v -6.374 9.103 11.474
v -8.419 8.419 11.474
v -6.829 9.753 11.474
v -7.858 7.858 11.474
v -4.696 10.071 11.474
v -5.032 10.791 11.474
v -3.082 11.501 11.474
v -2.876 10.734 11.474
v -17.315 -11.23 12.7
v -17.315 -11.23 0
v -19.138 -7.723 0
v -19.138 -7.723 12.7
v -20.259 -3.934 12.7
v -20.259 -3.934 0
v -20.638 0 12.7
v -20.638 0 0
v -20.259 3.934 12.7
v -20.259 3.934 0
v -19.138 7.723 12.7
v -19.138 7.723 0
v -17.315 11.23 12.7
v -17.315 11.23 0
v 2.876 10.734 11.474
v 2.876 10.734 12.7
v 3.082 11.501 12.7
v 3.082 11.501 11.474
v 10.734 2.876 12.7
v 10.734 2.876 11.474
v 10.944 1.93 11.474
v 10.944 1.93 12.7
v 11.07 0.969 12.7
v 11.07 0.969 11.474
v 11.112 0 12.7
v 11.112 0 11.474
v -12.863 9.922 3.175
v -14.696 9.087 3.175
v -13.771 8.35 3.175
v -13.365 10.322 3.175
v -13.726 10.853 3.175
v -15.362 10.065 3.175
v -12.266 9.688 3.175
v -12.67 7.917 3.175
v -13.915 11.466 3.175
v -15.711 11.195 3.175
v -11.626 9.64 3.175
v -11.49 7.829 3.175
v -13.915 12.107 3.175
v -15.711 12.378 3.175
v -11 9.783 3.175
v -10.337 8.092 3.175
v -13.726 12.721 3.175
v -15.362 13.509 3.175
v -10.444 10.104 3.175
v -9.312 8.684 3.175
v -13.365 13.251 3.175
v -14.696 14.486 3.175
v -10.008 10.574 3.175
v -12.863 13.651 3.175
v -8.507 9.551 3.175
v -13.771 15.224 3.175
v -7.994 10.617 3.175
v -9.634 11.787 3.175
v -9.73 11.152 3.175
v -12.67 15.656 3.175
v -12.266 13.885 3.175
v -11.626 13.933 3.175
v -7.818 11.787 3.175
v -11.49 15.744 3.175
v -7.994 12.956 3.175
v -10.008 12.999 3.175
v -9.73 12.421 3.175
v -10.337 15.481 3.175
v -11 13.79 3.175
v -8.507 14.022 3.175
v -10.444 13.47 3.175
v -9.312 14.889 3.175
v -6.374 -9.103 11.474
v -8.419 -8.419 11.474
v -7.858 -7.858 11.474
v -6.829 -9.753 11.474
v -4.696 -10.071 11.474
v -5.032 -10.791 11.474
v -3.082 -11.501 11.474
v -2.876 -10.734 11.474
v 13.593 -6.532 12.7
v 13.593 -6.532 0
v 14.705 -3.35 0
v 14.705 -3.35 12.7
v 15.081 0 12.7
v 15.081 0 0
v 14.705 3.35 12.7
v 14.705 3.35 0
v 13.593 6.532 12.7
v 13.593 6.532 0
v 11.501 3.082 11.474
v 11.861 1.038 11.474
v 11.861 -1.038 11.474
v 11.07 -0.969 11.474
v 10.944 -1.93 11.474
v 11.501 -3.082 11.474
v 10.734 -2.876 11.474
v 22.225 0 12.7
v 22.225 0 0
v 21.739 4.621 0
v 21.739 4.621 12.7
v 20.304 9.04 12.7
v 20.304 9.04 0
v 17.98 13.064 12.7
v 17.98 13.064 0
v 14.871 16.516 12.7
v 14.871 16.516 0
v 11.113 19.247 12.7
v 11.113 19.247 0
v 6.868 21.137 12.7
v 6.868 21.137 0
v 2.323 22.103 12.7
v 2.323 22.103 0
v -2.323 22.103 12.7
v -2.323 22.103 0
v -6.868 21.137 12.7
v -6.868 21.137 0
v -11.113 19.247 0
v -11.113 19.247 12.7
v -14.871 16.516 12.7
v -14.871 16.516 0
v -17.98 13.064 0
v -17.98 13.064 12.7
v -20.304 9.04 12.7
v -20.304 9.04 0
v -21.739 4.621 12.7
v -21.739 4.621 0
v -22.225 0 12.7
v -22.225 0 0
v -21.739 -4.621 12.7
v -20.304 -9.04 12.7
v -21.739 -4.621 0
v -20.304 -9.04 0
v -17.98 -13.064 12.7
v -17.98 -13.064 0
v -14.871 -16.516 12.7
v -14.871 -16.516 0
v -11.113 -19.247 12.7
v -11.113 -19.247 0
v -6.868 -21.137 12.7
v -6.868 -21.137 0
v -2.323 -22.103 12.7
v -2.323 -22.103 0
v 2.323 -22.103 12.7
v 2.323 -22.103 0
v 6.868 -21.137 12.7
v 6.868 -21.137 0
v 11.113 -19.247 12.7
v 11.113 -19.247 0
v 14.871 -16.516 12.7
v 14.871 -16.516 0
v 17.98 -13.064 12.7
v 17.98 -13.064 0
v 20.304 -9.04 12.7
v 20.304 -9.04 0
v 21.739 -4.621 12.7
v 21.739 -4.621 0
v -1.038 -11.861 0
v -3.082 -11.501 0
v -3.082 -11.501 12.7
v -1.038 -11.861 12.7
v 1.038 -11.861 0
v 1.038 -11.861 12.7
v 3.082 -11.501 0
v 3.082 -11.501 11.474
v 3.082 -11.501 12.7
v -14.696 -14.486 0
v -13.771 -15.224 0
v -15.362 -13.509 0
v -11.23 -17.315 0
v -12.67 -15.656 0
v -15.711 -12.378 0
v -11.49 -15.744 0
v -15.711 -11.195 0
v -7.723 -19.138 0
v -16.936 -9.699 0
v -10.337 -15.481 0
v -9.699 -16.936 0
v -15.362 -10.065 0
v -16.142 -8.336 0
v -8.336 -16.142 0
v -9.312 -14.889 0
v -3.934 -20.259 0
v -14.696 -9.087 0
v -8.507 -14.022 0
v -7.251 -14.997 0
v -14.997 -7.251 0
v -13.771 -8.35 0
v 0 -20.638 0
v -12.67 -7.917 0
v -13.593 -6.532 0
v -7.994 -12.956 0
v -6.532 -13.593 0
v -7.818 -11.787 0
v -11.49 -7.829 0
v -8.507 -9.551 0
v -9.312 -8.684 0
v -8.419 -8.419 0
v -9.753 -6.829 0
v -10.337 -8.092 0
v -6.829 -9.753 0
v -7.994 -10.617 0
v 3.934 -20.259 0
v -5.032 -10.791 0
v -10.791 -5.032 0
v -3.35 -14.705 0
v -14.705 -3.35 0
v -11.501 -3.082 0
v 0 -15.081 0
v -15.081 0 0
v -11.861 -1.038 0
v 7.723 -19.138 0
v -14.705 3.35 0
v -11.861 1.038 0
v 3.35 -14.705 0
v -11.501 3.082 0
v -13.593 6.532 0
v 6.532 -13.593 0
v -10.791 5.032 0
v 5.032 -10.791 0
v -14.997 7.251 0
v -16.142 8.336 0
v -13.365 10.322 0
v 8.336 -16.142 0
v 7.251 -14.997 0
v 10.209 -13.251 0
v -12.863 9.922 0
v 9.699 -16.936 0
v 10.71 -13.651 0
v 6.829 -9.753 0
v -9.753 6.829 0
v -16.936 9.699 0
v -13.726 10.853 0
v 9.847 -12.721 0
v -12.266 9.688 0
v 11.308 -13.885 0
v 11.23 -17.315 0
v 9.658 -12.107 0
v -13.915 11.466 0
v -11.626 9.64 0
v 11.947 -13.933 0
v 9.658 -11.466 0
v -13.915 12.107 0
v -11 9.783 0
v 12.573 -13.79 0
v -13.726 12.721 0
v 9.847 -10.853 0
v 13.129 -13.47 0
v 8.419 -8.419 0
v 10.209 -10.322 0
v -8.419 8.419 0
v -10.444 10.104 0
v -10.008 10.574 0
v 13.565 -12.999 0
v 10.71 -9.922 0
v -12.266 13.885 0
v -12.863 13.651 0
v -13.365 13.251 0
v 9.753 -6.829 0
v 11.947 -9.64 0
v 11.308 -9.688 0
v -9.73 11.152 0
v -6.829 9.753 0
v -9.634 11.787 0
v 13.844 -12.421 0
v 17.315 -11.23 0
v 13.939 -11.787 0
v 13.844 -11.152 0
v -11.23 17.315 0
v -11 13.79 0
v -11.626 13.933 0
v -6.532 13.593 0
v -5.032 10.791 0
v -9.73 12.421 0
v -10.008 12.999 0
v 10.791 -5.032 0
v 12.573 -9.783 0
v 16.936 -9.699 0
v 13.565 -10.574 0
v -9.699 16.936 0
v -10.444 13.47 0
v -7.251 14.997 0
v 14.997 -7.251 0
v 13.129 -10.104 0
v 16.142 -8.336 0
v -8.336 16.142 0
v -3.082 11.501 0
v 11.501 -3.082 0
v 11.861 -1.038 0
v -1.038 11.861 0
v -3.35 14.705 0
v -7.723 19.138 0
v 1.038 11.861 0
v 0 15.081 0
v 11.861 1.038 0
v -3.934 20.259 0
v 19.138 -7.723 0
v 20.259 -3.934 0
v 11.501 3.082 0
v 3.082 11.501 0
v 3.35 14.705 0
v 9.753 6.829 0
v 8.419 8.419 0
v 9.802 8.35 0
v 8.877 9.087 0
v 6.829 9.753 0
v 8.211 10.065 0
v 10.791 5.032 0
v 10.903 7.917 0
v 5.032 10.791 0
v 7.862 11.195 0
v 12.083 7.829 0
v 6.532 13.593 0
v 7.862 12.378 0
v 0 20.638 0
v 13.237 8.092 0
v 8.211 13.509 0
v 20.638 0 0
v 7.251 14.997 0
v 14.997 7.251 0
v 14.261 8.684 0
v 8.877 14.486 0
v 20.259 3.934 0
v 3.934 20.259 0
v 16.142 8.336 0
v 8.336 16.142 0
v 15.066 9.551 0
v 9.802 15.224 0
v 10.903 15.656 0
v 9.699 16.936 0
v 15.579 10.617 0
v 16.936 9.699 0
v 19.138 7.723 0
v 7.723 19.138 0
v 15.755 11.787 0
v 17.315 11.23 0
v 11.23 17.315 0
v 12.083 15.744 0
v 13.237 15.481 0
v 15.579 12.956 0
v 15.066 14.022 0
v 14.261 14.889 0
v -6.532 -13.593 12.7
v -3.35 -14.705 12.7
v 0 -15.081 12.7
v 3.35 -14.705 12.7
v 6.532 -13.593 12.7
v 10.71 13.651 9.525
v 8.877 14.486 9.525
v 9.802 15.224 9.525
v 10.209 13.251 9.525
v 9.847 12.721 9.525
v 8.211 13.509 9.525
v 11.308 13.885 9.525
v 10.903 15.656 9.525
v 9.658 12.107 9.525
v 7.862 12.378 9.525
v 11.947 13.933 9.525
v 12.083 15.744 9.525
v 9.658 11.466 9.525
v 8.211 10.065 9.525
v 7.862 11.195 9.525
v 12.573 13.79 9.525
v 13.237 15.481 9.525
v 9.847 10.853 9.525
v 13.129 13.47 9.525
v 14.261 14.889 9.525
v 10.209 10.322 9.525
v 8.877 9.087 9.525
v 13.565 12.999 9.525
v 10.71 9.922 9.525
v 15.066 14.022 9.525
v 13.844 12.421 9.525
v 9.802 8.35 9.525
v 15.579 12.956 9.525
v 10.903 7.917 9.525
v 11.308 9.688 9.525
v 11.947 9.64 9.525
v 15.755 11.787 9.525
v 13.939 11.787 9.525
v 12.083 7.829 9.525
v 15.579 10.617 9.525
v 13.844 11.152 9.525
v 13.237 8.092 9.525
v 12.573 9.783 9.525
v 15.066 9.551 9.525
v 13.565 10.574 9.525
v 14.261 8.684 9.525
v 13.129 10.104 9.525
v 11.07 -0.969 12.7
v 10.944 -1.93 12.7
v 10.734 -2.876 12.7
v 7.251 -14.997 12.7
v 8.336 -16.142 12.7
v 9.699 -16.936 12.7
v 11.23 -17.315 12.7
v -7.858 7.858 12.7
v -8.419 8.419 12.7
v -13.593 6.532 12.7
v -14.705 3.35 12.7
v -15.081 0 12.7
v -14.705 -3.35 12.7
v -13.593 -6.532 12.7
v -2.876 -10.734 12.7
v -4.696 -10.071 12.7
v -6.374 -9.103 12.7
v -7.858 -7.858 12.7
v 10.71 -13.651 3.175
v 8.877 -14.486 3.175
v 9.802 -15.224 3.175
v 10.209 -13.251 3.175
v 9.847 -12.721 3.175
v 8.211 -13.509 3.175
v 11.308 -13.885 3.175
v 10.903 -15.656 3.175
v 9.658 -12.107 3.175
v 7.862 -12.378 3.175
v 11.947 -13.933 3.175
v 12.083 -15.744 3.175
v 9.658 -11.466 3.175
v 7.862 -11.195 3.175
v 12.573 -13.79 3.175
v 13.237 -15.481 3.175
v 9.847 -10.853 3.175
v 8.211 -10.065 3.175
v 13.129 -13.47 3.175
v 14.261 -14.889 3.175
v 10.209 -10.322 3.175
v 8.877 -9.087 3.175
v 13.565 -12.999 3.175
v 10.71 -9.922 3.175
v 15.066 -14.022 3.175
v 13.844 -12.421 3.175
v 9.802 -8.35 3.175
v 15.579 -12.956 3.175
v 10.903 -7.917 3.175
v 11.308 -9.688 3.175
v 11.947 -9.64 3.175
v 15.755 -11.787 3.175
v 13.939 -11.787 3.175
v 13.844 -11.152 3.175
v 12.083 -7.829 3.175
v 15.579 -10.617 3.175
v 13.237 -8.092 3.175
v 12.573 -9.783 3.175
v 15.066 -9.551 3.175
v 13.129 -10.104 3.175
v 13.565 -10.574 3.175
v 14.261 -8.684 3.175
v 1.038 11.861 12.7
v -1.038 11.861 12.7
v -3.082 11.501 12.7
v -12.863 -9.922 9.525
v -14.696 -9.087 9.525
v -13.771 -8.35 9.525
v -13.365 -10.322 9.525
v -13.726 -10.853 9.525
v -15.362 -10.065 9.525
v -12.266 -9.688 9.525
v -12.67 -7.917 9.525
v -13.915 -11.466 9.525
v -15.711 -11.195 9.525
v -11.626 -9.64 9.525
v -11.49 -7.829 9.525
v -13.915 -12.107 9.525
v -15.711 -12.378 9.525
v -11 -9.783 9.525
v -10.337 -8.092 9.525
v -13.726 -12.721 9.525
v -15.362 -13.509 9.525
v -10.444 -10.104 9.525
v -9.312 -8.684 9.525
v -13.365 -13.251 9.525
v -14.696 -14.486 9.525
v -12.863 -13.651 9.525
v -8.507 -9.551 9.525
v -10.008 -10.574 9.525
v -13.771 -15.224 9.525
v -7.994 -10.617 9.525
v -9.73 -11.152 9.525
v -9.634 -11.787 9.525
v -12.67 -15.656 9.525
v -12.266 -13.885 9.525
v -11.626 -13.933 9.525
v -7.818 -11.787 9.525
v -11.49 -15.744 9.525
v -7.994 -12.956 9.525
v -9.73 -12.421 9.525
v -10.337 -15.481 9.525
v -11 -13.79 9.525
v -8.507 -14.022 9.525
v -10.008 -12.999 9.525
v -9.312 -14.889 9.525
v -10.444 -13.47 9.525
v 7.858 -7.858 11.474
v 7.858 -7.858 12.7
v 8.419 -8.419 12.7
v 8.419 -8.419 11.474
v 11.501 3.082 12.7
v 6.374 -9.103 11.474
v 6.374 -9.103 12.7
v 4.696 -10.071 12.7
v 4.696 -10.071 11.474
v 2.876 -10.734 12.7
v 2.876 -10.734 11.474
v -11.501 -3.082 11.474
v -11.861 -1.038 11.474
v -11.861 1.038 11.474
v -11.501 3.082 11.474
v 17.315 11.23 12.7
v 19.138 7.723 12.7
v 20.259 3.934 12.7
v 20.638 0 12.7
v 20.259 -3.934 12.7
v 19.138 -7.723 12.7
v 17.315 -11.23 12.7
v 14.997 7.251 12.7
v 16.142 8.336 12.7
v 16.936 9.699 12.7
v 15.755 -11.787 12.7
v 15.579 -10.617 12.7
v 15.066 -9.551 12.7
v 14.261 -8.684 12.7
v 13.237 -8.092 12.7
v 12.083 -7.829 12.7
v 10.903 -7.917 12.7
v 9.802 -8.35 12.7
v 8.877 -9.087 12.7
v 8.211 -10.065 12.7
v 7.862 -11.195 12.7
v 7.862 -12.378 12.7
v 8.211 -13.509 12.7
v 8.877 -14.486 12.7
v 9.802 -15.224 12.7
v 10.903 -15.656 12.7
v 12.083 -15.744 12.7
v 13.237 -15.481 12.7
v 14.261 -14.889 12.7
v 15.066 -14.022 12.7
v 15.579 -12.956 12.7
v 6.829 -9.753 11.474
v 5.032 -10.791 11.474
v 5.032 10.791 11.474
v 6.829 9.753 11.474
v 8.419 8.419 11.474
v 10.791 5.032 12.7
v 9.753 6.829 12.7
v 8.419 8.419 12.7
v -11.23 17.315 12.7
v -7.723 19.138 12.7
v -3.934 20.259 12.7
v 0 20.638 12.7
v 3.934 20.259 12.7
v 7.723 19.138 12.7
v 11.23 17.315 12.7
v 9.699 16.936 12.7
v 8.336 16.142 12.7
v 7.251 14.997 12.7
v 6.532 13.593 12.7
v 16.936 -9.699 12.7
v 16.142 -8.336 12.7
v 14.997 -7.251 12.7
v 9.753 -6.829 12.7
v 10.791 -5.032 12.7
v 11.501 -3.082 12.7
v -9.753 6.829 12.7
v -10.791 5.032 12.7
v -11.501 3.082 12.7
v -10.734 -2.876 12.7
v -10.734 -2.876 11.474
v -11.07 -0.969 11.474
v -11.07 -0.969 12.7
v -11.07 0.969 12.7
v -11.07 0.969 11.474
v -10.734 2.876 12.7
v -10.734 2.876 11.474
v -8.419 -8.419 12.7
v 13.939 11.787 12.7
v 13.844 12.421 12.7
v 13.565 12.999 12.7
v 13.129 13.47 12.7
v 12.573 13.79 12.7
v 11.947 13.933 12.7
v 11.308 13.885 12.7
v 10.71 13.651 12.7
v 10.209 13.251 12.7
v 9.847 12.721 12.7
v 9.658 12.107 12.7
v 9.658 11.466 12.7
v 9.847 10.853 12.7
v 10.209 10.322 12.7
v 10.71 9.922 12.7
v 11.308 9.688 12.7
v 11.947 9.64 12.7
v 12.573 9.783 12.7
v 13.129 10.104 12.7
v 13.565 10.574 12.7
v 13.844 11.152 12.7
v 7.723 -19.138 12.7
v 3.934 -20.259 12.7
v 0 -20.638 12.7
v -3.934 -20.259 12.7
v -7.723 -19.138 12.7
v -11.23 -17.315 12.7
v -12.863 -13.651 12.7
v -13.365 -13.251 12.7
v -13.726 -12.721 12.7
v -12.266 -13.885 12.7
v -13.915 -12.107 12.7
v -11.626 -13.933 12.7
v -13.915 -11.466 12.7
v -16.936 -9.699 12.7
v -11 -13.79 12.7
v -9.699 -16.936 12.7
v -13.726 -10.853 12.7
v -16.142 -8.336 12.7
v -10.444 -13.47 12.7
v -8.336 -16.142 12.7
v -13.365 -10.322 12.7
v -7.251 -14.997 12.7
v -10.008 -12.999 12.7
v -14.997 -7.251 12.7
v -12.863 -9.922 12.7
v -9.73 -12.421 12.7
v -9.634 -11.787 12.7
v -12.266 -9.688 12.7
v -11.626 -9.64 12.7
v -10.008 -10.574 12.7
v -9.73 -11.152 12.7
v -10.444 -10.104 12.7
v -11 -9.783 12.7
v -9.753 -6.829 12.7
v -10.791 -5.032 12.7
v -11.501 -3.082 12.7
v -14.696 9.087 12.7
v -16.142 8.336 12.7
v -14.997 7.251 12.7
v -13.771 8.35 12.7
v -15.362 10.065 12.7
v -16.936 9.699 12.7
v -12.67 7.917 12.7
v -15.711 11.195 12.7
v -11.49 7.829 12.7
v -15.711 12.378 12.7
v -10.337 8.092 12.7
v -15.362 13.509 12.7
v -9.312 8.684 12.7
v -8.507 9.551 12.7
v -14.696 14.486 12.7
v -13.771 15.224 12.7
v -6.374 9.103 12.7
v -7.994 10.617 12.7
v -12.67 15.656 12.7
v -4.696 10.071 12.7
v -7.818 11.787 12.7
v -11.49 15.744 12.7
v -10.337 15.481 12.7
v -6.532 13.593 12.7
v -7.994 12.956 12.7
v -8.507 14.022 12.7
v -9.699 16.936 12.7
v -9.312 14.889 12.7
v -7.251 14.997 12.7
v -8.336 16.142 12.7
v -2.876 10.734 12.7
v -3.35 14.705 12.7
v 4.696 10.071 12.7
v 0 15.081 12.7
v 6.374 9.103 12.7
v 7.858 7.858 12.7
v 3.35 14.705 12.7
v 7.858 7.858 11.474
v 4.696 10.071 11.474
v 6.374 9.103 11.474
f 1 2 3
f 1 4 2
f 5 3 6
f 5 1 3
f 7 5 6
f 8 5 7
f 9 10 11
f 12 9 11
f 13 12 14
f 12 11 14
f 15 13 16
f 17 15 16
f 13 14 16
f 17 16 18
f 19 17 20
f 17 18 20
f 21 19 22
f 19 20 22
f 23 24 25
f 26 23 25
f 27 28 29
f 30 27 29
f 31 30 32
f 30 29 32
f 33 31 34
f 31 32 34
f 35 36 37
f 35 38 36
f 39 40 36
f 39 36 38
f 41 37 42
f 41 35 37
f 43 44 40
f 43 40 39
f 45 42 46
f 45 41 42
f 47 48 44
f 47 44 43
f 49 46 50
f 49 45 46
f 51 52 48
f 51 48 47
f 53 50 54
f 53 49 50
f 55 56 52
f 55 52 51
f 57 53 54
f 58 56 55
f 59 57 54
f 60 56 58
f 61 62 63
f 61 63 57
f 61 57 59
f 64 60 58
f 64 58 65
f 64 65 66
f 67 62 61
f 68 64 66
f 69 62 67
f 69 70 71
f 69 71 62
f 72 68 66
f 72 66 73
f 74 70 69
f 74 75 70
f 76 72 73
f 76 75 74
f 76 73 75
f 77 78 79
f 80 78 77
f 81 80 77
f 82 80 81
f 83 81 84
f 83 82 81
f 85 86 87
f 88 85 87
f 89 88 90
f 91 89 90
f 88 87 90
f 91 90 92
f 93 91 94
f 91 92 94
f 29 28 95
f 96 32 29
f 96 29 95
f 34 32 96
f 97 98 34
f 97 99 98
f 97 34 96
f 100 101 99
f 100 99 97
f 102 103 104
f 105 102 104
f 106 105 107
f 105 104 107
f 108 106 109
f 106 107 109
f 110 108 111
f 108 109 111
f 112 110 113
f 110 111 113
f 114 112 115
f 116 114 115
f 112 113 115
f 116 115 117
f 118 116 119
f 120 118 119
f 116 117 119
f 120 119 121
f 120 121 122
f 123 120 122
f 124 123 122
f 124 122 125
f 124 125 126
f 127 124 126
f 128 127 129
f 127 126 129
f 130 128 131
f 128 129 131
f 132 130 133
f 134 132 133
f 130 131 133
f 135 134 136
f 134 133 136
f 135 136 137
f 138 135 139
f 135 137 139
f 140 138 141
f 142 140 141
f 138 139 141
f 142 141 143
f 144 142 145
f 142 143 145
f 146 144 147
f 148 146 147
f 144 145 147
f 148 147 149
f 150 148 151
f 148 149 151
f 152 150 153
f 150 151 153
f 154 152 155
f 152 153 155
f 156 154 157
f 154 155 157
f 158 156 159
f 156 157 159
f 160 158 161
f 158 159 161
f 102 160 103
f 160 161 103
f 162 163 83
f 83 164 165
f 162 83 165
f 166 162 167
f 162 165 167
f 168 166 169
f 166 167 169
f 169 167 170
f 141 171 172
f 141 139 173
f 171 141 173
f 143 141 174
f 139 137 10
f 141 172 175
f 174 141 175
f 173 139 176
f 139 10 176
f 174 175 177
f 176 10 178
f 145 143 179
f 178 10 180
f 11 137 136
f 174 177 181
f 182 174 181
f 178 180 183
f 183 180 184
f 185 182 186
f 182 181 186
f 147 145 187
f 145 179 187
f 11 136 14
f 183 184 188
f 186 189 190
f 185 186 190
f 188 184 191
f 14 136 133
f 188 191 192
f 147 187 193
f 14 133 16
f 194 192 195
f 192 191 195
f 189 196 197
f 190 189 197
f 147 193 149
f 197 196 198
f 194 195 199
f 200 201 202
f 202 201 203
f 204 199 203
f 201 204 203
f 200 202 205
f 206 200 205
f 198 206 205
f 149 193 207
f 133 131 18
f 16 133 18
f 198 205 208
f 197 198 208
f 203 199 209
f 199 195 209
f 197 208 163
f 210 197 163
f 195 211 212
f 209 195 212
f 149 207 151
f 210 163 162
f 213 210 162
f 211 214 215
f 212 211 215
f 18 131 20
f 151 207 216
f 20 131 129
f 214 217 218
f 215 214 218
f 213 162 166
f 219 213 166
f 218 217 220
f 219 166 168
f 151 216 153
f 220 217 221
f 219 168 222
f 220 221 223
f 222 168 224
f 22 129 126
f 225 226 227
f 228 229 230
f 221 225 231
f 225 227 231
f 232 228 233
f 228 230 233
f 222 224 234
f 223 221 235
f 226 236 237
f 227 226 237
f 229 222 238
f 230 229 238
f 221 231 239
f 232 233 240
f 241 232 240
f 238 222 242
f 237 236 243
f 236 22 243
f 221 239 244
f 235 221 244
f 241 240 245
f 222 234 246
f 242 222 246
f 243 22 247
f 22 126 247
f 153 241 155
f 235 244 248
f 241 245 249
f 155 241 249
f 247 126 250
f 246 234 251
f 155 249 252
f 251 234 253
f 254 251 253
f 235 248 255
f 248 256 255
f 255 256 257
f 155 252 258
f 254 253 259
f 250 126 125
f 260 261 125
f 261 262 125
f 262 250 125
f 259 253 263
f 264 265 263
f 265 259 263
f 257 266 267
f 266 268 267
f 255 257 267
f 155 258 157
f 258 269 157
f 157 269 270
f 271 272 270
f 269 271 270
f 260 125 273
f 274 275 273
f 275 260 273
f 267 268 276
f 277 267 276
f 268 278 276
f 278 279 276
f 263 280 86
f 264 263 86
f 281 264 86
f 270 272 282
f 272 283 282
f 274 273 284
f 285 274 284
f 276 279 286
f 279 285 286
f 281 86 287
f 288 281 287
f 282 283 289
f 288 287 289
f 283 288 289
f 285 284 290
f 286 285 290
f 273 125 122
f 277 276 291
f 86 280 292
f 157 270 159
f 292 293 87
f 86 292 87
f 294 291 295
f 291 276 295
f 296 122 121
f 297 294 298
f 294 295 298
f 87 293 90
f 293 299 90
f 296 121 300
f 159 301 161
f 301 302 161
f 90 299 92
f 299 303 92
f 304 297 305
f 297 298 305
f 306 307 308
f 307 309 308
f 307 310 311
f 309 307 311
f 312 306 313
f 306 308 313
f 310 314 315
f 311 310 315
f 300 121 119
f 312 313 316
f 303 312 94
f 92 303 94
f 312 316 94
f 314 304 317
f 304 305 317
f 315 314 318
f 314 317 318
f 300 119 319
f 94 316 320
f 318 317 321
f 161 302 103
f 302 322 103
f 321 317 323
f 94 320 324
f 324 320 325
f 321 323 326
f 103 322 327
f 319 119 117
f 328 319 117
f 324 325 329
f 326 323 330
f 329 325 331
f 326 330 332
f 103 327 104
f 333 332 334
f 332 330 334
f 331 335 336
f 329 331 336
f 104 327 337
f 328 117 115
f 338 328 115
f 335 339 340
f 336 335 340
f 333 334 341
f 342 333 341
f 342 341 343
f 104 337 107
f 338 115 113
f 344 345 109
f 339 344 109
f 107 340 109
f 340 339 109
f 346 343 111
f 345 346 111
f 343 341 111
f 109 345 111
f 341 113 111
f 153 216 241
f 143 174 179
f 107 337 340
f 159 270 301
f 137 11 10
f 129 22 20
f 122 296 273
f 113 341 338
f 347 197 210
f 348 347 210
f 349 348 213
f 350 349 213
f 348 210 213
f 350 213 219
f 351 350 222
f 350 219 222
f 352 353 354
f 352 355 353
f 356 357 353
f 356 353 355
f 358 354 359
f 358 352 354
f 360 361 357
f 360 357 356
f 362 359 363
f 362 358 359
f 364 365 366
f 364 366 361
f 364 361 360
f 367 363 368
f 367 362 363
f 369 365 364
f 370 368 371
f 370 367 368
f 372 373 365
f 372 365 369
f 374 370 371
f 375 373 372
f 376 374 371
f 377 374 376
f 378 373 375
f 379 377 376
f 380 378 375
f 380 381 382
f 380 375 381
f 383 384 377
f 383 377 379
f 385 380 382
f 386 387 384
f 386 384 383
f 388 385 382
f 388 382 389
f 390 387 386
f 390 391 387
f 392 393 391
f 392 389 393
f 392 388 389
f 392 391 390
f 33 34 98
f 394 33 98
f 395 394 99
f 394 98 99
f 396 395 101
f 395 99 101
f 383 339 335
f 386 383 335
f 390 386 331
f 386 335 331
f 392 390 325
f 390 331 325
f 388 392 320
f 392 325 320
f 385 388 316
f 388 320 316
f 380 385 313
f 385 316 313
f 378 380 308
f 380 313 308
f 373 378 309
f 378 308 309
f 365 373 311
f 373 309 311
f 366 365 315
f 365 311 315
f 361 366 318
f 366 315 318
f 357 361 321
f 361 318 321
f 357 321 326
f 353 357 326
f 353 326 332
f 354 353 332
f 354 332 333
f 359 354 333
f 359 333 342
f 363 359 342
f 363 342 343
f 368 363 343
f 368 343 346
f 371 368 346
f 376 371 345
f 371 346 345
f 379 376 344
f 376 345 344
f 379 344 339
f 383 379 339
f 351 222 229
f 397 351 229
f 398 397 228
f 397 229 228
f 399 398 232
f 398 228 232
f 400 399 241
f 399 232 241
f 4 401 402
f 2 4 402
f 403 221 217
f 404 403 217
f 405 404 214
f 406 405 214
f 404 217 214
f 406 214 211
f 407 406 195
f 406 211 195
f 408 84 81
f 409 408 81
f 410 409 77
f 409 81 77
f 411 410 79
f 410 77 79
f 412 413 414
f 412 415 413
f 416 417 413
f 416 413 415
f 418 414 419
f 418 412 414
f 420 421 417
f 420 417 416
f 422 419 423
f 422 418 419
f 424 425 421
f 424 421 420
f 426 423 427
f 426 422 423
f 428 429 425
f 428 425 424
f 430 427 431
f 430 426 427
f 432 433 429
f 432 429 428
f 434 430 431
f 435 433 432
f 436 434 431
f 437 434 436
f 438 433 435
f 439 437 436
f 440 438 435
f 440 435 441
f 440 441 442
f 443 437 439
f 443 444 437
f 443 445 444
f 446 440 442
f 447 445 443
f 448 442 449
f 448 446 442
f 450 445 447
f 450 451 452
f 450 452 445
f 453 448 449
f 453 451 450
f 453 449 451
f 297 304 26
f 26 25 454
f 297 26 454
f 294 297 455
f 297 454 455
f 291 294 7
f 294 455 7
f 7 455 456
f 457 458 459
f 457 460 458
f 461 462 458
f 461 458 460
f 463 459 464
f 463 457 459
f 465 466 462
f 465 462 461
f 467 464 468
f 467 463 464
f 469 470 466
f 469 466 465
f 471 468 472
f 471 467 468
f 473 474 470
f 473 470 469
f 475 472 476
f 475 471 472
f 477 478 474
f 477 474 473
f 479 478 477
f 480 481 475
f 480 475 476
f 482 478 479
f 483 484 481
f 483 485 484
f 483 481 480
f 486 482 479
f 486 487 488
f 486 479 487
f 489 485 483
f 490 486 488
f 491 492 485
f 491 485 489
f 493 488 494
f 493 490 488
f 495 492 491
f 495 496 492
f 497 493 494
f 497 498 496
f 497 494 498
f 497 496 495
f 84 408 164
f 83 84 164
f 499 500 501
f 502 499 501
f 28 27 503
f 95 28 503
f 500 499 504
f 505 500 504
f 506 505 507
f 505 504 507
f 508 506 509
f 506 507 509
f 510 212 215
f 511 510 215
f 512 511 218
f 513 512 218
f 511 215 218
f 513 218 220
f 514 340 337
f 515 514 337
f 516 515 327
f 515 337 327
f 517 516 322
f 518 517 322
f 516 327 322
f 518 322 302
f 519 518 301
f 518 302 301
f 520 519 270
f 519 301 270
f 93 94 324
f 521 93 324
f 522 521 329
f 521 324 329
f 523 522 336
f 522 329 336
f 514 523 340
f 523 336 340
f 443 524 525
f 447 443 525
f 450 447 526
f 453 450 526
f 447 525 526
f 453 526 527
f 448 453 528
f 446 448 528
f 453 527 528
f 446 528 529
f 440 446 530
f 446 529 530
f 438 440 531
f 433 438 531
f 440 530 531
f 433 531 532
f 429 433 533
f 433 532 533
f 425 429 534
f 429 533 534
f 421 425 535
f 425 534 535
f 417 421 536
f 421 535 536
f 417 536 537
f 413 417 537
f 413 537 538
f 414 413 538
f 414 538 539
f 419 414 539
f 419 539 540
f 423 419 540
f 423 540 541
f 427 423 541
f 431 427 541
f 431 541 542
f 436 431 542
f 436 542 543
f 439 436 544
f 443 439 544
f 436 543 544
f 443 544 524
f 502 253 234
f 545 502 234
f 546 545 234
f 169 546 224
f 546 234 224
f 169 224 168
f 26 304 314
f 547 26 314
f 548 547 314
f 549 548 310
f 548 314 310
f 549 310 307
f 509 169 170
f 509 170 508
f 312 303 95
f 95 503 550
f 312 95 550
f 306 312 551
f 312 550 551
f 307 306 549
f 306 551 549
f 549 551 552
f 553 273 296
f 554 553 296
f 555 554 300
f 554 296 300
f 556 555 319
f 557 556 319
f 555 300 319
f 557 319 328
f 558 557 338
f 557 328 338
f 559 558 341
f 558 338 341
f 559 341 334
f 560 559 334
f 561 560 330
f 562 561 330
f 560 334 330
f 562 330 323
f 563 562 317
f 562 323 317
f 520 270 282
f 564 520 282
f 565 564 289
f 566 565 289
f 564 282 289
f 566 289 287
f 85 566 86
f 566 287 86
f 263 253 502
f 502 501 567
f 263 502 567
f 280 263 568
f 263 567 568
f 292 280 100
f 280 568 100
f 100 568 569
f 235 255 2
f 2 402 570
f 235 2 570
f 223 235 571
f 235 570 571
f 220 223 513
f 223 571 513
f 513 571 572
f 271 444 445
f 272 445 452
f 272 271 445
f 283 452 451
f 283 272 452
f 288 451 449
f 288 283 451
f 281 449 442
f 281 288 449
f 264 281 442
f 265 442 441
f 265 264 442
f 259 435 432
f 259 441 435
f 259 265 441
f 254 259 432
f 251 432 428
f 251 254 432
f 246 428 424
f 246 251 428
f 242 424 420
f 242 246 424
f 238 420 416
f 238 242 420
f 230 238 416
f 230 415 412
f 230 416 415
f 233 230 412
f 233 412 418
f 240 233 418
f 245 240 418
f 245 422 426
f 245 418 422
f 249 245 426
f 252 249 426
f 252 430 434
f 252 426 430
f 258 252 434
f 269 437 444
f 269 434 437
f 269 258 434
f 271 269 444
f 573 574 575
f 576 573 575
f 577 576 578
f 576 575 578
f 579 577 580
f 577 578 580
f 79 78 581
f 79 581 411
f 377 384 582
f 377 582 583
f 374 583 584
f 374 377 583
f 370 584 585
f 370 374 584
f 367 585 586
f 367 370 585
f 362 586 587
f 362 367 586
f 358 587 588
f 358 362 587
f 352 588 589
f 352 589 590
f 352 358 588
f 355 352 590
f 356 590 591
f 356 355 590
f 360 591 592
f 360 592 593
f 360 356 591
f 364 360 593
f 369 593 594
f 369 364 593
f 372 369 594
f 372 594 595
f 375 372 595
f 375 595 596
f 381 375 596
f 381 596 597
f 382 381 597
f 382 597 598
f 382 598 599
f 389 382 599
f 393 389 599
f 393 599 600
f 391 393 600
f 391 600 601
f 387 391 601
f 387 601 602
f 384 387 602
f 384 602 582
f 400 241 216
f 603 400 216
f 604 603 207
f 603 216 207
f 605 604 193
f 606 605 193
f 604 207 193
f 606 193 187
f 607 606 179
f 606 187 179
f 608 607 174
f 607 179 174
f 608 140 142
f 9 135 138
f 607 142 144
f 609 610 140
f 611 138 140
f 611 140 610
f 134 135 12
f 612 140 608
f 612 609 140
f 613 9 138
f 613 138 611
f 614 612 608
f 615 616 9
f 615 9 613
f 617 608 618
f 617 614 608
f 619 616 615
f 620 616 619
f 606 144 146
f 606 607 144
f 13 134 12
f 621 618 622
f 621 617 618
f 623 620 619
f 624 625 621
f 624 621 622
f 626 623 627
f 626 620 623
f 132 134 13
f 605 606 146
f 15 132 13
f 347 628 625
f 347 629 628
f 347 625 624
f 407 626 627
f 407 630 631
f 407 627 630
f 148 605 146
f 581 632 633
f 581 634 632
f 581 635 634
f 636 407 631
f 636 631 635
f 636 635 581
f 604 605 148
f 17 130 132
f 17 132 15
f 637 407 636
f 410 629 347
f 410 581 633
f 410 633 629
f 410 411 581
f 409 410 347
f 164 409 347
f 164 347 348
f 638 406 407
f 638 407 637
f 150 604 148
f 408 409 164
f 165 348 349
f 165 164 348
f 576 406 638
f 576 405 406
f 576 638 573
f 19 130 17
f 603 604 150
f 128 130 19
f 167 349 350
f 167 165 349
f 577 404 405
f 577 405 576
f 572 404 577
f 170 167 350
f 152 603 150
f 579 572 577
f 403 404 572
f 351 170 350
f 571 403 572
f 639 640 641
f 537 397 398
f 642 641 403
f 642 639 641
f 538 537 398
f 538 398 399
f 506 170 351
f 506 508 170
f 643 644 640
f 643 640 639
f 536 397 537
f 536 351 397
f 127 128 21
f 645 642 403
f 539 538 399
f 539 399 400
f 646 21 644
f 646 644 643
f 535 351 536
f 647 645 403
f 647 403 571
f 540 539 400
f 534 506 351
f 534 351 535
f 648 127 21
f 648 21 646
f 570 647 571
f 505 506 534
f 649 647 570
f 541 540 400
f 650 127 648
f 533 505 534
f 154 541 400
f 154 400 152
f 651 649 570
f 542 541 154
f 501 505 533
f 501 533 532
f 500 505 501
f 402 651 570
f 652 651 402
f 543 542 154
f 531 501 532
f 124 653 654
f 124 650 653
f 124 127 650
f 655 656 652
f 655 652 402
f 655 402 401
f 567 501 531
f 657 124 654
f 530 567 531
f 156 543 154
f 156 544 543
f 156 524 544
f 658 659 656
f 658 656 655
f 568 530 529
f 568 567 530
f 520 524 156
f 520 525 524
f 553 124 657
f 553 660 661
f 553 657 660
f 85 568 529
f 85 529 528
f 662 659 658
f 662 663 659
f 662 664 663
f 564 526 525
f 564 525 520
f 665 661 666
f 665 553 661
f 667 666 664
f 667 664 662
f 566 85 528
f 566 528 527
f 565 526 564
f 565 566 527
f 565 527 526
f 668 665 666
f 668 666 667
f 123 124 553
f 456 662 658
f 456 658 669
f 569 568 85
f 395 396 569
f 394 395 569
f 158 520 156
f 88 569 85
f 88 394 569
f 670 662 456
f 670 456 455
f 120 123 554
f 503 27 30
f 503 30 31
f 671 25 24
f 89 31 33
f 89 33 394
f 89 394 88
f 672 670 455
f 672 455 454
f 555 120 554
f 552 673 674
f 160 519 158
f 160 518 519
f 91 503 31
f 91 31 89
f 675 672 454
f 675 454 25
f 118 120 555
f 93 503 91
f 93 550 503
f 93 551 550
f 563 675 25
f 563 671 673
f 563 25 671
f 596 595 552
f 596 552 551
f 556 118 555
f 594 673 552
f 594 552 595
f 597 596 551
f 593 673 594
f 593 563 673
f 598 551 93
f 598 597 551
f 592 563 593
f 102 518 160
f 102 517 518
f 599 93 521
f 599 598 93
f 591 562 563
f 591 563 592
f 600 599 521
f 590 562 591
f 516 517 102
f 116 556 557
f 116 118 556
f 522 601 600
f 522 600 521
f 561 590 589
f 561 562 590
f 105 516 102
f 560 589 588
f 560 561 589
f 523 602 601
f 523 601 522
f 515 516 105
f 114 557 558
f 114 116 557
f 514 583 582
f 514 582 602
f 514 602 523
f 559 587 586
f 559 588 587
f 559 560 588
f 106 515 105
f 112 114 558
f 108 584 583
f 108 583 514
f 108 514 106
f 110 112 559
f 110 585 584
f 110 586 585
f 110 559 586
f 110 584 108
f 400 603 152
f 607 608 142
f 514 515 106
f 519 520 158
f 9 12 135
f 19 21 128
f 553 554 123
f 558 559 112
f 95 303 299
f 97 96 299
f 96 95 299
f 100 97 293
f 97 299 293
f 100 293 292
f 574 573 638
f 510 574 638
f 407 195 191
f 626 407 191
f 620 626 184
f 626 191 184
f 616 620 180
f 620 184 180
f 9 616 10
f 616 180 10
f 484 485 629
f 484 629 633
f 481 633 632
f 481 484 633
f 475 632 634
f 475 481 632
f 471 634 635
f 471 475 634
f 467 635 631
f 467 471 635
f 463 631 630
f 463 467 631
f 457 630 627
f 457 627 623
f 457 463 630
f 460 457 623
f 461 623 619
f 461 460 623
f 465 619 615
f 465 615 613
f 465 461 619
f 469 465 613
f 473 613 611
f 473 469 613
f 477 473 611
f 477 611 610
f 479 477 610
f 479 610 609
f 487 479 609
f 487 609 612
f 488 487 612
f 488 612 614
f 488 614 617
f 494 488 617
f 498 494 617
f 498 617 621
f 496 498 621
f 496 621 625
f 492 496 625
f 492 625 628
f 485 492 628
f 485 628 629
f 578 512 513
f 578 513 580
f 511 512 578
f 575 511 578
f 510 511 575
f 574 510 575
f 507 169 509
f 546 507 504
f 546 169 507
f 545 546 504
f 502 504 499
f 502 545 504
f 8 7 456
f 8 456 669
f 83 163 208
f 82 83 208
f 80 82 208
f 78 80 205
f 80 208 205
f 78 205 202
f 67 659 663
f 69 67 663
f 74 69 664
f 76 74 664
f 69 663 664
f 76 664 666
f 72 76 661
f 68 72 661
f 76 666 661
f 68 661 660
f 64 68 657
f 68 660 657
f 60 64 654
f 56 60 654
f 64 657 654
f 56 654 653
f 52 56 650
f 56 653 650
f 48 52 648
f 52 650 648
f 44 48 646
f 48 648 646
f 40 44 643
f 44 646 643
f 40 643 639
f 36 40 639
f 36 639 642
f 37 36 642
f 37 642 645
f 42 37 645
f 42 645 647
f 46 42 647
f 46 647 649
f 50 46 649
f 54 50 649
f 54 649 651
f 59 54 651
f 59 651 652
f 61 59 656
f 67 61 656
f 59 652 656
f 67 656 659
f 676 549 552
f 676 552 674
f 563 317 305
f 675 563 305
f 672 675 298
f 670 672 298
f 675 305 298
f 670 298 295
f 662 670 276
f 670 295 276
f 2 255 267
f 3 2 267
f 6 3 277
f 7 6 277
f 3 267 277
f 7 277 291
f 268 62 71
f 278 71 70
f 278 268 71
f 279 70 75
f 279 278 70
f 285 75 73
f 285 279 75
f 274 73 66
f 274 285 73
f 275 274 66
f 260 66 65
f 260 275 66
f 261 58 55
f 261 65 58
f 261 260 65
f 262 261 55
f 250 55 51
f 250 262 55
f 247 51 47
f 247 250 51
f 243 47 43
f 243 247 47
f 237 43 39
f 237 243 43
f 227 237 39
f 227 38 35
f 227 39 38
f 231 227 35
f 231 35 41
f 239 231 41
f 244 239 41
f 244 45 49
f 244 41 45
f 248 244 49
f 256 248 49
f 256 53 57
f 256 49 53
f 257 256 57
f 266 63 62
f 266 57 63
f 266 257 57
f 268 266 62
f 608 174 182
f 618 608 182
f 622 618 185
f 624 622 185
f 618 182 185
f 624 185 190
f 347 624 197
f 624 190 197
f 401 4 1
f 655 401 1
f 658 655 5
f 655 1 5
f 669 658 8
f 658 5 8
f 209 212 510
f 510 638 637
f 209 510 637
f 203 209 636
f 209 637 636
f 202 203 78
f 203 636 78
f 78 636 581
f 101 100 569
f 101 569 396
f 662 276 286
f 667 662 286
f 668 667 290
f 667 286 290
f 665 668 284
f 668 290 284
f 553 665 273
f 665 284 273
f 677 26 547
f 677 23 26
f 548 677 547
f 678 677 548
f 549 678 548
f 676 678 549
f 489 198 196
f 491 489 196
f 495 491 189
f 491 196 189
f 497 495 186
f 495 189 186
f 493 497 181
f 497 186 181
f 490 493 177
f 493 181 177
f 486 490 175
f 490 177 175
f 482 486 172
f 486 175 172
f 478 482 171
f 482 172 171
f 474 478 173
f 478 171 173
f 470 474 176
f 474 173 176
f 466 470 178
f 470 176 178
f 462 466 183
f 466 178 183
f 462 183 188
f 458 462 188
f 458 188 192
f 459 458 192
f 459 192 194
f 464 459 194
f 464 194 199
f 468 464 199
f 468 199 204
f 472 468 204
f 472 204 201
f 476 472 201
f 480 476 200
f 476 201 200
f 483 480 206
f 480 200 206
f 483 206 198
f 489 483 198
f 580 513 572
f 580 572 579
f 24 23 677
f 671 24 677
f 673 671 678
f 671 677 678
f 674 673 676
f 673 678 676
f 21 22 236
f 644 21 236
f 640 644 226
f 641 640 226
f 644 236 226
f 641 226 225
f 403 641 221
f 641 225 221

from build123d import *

# Parameters (mm, degrees)
F0_R             = 22.225
F0_R_2           = 2.15265
F1_DEPTH         = 12.7
F3_DEPTH         = 12.7
F4_COUNT         = 6
F4_ANGLE         = 300
F6_R             = 11.90625
F7_DEPTH         = 11.47445
F10_R            = 3.96875
F11_DEPTH        = 9.525
F12_R            = 3.96875
F13_DEPTH        = 9.525
F15_DEPTH        = 12.7
F15_COPIES_COUNT = 4


# Not quite as in the source:
# - a pattern or mirror of a feature is missing from the dataset's text; its kind, count and spacing are read off the source's solid


with BuildPart() as f1:
    # F0 (on Top) → F1 (new body)
    with BuildSketch(Plane.XY):
        Circle(F0_R)
        with Locations((-11.7865861589, -11.7865861589)):
            Circle(F0_R_2, mode=Mode.SUBTRACT)
        with Locations((11.7865861589, -11.7865861589)):
            Circle(F0_R_2, mode=Mode.SUBTRACT)
        with Locations((-11.7865861589, 11.7865861589)):
            Circle(F0_R_2, mode=Mode.SUBTRACT)
        with BuildLine():
            ThreePointArc((0, 11.1125), (7.8577241059, 7.8577241059), (11.1125, 0))
            ThreePointArc((11.1125, 0), (-7.8577241059, -7.8577241059), (0, 11.1125))
        make_face(mode=Mode.SUBTRACT)
        with Locations((11.7865861589, 11.7865861589)):
            Circle(F0_R_2, mode=Mode.SUBTRACT)
    extrude(amount=F1_DEPTH)

    # F2 (on face) → F3 (cut, through all)
    with BuildSketch(Plane.XY.offset(12.7)):
        with BuildLine():
            ThreePointArc((-2.8761266387, 10.7338507446), (0, 11.1125), (2.8761266387, 10.7338507446))
            Line((2.8761266387, 10.7338507446), (3.0815642558, 11.5005543693))
            ThreePointArc((3.0815642558, 11.5005543693), (0, 11.90625), (-3.0815642558, 11.5005543693))
            Line((-3.0815642558, 11.5005543693), (-2.8761266387, 10.7338507446))
        make_face()
    f3 = extrude(amount=-F3_DEPTH, mode=Mode.SUBTRACT)

    # F4: F3 ×6 about axis
    f4_axis = Axis((0, 0, 0), (0, 0, -1))
    for i in range(1, F4_COUNT):
        add(f3.rotate(f4_axis, i * F4_ANGLE / (F4_COUNT - 1)), mode=Mode.SUBTRACT)

    # F6 (on face) → F7 (cut, through all)
    with BuildSketch(Plane(origin=(0, 0, 0), x_dir=(1, 0, 0), z_dir=(0, 0, -1))):
        Circle(F6_R)
    extrude(amount=-F7_DEPTH, mode=Mode.SUBTRACT)

    # F10 (on face) → F11 (cut, through all)
    with BuildSketch(Plane(origin=(0, 0, 0), x_dir=(1, 0, 0), z_dir=(0, 0, -1))):
        with Locations((11.7865861589, -11.7865861589)):
            Circle(F10_R)
        with Locations((-11.7865861589, 11.7865861589)):
            Circle(F10_R)
    extrude(amount=-F11_DEPTH, mode=Mode.SUBTRACT)

    # F12 (on face) → F13 (cut, through all)
    with BuildSketch(Plane.XY.offset(12.7)):
        with Locations((-11.7865861589, 11.7865861589)):
            Circle(F12_R)
        with Locations((11.7865861589, -11.7865861589)):
            Circle(F12_R)
    extrude(amount=-F13_DEPTH, mode=Mode.SUBTRACT)

    # F14 (on face) → F15 (cut, through all)
    with BuildSketch(Plane(origin=(0, 0, 0), x_dir=(1, 0, 0), z_dir=(0, 0, -1))):
        with BuildLine():
            ThreePointArc((-11.229543123, 17.3148424047), (-8.3361072587, 16.1415958514), (-6.5322351826, 13.5931602316))
            ThreePointArc((-6.5322351826, 13.5931602316), (0, 15.08125), (6.5322351826, 13.5931602316))
            ThreePointArc((6.5322351826, 13.5931602316), (8.3361072587, 16.1415958514), (11.229543123, 17.3148424047))
            ThreePointArc((11.229543123, 17.3148424047), (0, 20.6375), (-11.229543123, 17.3148424047))
        make_face()
    f15 = extrude(amount=-F15_DEPTH, mode=Mode.SUBTRACT)

    # F15_copies: F15 ×4 about axis
    f15_copies_axis = Axis((0, 0, 0), (0, 0, 1))
    for i in range(1, F15_COPIES_COUNT):
        add(f15.rotate(f15_copies_axis, i * 360 / F15_COPIES_COUNT), mode=Mode.SUBTRACT)


solid = f1.part
